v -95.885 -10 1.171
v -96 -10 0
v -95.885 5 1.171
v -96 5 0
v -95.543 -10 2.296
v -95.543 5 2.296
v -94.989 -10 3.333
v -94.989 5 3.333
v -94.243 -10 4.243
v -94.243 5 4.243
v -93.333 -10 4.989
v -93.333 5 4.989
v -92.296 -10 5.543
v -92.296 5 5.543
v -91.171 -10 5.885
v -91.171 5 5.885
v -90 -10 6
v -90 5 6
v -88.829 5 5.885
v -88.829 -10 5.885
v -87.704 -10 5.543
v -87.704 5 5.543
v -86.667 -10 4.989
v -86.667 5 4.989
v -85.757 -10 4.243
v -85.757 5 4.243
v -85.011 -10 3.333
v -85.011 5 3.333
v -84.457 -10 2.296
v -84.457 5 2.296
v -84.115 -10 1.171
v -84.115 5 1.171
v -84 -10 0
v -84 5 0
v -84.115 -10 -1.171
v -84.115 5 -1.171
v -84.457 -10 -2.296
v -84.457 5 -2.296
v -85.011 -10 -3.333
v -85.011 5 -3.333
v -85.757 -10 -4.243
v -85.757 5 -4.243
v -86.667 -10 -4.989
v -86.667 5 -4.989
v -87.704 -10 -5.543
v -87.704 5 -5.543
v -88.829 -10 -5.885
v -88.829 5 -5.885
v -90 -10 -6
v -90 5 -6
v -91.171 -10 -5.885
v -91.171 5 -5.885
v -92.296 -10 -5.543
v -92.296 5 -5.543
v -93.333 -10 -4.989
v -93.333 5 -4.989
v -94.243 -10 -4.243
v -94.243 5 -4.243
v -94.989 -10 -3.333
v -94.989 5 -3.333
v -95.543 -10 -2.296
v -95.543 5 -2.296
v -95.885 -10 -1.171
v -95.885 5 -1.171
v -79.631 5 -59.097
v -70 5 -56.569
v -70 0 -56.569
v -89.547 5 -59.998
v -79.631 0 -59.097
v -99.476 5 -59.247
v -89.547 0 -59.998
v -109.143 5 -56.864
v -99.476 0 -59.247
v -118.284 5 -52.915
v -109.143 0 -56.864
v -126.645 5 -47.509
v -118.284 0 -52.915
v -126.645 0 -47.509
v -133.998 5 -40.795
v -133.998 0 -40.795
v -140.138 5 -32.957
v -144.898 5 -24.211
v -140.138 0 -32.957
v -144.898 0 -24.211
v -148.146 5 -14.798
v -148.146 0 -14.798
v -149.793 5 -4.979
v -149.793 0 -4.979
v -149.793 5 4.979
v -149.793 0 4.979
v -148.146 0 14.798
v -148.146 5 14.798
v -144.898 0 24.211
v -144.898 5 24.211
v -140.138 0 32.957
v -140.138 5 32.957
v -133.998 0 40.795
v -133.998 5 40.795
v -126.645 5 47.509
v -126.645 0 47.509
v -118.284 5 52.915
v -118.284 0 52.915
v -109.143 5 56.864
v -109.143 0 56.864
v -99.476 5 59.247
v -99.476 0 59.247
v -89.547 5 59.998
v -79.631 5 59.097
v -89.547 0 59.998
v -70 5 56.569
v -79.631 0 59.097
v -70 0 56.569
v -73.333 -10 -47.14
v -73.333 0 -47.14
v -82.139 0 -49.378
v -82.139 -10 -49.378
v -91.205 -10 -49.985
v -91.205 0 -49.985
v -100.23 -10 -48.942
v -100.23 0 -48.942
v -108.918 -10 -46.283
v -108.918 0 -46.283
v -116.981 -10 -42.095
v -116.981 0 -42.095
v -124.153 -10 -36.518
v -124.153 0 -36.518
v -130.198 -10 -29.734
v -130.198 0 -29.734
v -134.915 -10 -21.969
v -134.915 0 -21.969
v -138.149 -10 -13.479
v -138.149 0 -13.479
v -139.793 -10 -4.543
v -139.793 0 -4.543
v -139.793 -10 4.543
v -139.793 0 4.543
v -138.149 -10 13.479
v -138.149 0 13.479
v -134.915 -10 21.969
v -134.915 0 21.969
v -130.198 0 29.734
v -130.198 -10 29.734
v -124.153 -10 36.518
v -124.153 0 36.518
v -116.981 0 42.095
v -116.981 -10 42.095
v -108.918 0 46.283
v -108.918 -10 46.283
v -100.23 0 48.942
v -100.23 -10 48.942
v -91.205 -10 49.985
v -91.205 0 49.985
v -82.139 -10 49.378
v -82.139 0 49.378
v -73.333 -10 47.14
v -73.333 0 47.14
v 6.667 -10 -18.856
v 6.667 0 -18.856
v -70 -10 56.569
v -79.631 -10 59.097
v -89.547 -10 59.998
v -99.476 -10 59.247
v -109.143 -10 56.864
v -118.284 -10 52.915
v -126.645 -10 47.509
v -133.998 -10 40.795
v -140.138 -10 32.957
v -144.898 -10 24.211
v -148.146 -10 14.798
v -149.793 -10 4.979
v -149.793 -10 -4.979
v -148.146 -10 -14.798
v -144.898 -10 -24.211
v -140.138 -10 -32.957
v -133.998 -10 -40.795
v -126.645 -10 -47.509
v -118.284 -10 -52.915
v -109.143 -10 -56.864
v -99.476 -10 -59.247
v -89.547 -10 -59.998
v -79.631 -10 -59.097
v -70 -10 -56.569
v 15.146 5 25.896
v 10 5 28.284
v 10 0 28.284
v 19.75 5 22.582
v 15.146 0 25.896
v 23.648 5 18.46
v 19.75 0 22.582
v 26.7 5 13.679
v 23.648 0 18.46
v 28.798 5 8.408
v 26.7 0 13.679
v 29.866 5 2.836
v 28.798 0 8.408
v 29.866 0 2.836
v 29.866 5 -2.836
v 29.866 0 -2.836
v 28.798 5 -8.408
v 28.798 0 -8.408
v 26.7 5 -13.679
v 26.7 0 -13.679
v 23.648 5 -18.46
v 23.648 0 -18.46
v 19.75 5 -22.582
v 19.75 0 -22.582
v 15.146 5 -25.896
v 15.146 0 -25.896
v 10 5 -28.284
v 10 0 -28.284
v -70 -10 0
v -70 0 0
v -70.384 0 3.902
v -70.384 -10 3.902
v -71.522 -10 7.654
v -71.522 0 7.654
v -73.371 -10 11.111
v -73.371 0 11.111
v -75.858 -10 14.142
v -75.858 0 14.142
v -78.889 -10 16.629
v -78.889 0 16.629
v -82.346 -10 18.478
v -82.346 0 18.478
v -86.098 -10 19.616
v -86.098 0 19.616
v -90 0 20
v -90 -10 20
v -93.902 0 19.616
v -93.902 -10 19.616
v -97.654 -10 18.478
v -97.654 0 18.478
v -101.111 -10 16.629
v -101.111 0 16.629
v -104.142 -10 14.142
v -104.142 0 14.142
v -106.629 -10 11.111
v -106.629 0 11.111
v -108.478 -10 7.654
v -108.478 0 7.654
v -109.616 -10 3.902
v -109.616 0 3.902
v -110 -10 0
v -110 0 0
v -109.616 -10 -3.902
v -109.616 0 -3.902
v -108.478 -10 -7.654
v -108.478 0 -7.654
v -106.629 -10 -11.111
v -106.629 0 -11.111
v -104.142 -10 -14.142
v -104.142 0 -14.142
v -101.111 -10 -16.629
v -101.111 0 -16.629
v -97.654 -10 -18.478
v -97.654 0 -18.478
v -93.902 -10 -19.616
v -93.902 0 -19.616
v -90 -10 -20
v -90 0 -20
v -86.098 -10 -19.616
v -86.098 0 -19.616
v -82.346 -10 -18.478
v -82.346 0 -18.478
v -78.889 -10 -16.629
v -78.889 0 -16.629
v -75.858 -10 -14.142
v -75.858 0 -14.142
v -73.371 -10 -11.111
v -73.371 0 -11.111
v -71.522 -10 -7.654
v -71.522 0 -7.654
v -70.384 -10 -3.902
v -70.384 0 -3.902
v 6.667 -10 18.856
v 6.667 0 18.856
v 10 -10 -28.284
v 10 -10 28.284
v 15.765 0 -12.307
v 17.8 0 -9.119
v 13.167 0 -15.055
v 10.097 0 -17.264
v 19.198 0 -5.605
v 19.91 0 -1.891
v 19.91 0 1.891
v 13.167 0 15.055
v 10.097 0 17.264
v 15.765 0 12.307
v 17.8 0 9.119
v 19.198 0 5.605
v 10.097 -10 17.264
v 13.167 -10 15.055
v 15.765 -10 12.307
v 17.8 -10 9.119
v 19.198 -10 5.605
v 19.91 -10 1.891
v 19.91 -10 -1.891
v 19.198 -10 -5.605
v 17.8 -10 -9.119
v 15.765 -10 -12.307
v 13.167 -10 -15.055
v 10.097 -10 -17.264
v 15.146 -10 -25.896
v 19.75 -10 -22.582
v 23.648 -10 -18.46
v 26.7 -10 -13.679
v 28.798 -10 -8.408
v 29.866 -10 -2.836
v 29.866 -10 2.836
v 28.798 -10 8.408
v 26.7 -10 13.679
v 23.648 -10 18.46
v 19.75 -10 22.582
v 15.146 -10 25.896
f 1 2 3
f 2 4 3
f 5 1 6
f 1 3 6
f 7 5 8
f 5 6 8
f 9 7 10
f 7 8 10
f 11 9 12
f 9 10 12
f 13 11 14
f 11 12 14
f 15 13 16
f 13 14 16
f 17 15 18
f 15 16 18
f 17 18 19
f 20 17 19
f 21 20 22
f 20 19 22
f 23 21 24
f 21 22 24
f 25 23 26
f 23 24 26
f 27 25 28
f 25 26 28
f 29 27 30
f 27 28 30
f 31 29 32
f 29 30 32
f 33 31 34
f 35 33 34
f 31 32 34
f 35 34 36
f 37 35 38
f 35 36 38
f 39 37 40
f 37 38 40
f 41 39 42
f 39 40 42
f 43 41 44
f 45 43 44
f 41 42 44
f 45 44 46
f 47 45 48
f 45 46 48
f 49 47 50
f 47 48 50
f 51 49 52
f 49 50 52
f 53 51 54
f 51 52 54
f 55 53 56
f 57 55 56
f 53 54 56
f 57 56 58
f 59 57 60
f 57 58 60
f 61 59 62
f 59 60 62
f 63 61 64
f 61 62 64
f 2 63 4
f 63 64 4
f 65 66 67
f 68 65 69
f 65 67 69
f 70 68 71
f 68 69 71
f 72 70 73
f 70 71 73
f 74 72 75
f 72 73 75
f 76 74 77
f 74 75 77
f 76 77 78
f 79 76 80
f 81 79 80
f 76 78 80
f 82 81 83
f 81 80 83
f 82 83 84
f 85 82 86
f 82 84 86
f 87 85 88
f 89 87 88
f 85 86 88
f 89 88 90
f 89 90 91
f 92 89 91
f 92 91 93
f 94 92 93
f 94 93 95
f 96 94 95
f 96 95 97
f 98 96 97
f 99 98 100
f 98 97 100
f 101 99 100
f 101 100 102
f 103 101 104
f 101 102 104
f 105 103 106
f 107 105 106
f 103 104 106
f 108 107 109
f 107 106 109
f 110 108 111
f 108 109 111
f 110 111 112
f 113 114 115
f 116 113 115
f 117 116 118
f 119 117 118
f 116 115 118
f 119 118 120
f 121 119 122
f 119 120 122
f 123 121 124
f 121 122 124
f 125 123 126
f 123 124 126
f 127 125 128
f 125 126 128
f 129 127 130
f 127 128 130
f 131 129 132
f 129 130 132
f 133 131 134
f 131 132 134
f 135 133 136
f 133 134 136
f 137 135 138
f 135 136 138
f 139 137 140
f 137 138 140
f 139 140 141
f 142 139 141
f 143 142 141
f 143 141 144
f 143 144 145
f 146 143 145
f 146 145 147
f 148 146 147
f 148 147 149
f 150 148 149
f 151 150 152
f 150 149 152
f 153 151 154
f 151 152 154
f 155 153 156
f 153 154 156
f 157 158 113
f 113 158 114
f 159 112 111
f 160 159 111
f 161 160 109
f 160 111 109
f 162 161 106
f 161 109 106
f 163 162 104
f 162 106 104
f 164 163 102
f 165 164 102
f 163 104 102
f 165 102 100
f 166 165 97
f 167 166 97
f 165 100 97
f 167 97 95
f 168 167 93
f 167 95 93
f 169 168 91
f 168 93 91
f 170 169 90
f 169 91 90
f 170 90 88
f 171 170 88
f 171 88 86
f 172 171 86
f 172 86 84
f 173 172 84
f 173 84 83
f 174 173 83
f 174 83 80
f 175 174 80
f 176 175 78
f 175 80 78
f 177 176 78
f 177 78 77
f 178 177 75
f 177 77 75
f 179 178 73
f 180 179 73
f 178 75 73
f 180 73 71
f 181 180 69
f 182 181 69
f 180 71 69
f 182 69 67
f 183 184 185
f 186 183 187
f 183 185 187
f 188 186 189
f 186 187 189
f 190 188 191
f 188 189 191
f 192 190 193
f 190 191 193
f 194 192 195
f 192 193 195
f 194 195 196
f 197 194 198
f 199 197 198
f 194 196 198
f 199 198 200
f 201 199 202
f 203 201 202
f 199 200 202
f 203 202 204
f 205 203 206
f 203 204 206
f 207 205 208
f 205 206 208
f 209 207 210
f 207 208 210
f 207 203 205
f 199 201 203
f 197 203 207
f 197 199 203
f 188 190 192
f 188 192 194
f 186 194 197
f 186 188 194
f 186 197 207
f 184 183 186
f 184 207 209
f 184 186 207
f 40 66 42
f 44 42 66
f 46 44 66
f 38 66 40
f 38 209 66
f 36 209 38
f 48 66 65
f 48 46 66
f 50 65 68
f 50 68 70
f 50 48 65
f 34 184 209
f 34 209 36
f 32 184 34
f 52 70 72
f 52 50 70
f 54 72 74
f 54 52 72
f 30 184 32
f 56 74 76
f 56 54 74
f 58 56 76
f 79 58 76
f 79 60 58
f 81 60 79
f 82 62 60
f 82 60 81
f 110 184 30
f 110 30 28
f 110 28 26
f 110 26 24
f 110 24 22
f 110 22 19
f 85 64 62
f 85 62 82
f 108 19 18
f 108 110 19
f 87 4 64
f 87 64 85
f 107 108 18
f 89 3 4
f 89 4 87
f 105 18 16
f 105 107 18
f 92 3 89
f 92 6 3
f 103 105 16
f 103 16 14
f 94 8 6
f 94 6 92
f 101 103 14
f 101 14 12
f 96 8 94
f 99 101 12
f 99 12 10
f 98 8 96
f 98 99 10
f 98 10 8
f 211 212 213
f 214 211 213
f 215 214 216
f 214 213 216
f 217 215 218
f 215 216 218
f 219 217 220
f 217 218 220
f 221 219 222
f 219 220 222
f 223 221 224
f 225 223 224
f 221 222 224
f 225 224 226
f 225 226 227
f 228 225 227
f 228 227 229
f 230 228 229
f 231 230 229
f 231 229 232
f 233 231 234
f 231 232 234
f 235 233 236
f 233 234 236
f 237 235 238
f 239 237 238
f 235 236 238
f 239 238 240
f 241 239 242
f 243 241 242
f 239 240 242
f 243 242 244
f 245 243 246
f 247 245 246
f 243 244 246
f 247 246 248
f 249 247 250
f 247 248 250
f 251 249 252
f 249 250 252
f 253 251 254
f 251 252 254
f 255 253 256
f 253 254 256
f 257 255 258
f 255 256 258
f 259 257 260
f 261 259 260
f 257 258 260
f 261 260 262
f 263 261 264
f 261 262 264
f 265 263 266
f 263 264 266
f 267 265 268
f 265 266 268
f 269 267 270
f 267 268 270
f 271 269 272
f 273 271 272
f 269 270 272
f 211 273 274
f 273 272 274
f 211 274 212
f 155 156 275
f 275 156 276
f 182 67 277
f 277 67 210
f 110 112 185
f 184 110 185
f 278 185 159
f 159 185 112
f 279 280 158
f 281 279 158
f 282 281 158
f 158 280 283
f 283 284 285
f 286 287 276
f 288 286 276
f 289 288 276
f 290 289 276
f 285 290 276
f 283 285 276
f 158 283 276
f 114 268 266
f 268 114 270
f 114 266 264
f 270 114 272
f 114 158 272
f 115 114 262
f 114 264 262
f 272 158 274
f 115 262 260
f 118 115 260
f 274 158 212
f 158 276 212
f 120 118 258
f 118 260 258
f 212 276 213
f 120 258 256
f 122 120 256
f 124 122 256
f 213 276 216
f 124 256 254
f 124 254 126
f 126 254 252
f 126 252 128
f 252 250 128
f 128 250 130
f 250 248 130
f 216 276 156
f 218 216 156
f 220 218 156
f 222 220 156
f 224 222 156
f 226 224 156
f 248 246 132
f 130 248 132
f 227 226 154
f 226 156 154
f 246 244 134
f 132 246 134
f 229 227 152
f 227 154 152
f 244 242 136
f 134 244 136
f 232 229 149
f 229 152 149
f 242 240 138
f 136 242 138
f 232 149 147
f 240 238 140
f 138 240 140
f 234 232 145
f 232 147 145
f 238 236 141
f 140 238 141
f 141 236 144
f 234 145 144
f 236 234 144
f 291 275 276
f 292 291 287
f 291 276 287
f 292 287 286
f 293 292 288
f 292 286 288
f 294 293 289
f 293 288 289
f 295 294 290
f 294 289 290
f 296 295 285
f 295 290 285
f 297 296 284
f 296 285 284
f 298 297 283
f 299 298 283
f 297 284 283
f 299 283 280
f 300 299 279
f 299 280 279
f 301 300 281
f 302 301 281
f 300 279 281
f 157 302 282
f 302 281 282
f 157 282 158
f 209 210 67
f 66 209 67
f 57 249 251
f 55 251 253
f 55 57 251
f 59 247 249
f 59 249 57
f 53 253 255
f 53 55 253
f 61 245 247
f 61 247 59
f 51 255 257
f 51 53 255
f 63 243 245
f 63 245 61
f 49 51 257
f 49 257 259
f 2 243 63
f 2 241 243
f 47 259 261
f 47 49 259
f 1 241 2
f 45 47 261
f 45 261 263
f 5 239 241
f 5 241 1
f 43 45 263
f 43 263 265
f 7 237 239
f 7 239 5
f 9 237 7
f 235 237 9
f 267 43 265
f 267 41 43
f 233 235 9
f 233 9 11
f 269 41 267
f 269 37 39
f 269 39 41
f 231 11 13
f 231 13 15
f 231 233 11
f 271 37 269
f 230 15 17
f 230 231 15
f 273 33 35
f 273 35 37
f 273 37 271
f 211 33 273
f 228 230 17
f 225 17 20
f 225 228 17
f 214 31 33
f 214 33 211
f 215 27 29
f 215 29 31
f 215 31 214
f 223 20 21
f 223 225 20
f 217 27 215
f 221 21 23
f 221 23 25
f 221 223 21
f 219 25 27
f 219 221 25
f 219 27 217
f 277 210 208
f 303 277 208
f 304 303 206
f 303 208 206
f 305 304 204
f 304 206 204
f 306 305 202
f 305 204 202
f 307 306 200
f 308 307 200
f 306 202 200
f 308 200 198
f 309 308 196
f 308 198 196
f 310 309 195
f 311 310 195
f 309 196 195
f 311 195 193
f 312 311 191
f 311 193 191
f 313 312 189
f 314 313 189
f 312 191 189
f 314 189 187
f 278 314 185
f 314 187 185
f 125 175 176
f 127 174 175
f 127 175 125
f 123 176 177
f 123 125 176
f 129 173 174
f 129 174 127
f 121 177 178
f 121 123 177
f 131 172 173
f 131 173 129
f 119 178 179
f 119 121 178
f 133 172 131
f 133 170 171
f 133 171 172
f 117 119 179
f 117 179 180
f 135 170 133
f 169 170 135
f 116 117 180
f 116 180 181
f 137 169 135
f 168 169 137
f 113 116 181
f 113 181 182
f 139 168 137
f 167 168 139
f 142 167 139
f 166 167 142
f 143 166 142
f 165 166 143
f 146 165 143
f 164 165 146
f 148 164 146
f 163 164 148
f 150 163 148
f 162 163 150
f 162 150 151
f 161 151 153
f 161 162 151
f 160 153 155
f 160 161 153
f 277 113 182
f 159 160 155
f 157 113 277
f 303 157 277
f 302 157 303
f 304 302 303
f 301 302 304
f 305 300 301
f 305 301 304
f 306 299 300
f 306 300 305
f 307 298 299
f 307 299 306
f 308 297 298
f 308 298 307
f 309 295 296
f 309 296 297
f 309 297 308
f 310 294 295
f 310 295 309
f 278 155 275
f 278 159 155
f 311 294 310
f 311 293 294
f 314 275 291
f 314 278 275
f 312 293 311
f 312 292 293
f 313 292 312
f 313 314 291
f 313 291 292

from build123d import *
from build123d import SkipClean  # not in build123d's __all__

# Parameters (mm, degrees)
F1_DEPTH = 10
F0_R     = 20
F3_DEPTH = 5
F5_D     = 12
F5_DEPTH = 15
F5_TIP   = 3.6051637142


# Not quite as in the source:
# - after a boolean that leaves OpenCascade's solid faulty, fix() repairs it


with BuildPart() as f1:
    # F0 (on Front) → F1 (new body)
    with BuildSketch(Plane.XZ):
        with BuildLine():
            Line((10, 28.2842712475), (-70, 56.5685424949))
            ThreePointArc((-70, 56.5685424949), (-150, 0), (-70, -56.5685424949))
            Line((-70, -56.5685424949), (10, -28.2842712475))
            ThreePointArc((10, -28.2842712475), (30, 0), (10, 28.2842712475))
        make_face()
        with BuildLine():
            ThreePointArc((-73.3333333333, -47.1404520791), (-140, 0), (-73.3333333333, 47.1404520791))
            Line((-73.3333333333, 47.1404520791), (6.6666666667, 18.8561808316))
            ThreePointArc((6.6666666667, 18.8561808316), (20, 0), (6.6666666667, -18.8561808316))
            Line((6.6666666667, -18.8561808316), (-73.3333333333, -47.1404520791))
        make_face(mode=Mode.SUBTRACT)
    extrude(amount=F1_DEPTH)



with BuildPart() as f1b:
    # F0 (on Front) → F1, piece 2 (new body)
    with BuildSketch(Plane.XZ):
        with Locations((-90, 0)):
            Circle(F0_R)
    extrude(amount=F1_DEPTH)


with BuildPart() as f1_1:
    add(f1.part, clean=False)

    with SkipClean():  # cleaning this boolean's faces spoils the solid; the shape is the same uncleaned
        add(f1b.part)  # F3 merges F1b
    # F2 (on face) → F3 (join)
    with BuildSketch(Plane(origin=(0, 0, 0), x_dir=(-1, 0, 0), z_dir=(0, 1, 0))):
        with BuildLine():
            ThreePointArc((70, -56.5685424949), (150, 0), (70, 56.5685424949))
            Line((70, 56.5685424949), (-10, 28.2842712475))
            ThreePointArc((-10, 28.2842712475), (-30, 0), (-10, -28.2842712475))
            Line((-10, -28.2842712475), (70, -56.5685424949))
        make_face()
    with SkipClean():  # cleaning this boolean's faces spoils the solid; the shape is the same uncleaned
        extrude(amount=F3_DEPTH)

    # F5
    with Locations(Plane.XZ.offset(10)):
        with Locations((-90, 0)):
            Hole(F5_D / 2, depth=F5_DEPTH)
            with Locations((0, 0, -(F5_DEPTH + F5_TIP / 2))):  # 118° drill point
                Cone(0, F5_D / 2, F5_TIP, mode=Mode.SUBTRACT)

    add(f1_1.part.fix(), mode=Mode.REPLACE)


solid = f1_1.part
